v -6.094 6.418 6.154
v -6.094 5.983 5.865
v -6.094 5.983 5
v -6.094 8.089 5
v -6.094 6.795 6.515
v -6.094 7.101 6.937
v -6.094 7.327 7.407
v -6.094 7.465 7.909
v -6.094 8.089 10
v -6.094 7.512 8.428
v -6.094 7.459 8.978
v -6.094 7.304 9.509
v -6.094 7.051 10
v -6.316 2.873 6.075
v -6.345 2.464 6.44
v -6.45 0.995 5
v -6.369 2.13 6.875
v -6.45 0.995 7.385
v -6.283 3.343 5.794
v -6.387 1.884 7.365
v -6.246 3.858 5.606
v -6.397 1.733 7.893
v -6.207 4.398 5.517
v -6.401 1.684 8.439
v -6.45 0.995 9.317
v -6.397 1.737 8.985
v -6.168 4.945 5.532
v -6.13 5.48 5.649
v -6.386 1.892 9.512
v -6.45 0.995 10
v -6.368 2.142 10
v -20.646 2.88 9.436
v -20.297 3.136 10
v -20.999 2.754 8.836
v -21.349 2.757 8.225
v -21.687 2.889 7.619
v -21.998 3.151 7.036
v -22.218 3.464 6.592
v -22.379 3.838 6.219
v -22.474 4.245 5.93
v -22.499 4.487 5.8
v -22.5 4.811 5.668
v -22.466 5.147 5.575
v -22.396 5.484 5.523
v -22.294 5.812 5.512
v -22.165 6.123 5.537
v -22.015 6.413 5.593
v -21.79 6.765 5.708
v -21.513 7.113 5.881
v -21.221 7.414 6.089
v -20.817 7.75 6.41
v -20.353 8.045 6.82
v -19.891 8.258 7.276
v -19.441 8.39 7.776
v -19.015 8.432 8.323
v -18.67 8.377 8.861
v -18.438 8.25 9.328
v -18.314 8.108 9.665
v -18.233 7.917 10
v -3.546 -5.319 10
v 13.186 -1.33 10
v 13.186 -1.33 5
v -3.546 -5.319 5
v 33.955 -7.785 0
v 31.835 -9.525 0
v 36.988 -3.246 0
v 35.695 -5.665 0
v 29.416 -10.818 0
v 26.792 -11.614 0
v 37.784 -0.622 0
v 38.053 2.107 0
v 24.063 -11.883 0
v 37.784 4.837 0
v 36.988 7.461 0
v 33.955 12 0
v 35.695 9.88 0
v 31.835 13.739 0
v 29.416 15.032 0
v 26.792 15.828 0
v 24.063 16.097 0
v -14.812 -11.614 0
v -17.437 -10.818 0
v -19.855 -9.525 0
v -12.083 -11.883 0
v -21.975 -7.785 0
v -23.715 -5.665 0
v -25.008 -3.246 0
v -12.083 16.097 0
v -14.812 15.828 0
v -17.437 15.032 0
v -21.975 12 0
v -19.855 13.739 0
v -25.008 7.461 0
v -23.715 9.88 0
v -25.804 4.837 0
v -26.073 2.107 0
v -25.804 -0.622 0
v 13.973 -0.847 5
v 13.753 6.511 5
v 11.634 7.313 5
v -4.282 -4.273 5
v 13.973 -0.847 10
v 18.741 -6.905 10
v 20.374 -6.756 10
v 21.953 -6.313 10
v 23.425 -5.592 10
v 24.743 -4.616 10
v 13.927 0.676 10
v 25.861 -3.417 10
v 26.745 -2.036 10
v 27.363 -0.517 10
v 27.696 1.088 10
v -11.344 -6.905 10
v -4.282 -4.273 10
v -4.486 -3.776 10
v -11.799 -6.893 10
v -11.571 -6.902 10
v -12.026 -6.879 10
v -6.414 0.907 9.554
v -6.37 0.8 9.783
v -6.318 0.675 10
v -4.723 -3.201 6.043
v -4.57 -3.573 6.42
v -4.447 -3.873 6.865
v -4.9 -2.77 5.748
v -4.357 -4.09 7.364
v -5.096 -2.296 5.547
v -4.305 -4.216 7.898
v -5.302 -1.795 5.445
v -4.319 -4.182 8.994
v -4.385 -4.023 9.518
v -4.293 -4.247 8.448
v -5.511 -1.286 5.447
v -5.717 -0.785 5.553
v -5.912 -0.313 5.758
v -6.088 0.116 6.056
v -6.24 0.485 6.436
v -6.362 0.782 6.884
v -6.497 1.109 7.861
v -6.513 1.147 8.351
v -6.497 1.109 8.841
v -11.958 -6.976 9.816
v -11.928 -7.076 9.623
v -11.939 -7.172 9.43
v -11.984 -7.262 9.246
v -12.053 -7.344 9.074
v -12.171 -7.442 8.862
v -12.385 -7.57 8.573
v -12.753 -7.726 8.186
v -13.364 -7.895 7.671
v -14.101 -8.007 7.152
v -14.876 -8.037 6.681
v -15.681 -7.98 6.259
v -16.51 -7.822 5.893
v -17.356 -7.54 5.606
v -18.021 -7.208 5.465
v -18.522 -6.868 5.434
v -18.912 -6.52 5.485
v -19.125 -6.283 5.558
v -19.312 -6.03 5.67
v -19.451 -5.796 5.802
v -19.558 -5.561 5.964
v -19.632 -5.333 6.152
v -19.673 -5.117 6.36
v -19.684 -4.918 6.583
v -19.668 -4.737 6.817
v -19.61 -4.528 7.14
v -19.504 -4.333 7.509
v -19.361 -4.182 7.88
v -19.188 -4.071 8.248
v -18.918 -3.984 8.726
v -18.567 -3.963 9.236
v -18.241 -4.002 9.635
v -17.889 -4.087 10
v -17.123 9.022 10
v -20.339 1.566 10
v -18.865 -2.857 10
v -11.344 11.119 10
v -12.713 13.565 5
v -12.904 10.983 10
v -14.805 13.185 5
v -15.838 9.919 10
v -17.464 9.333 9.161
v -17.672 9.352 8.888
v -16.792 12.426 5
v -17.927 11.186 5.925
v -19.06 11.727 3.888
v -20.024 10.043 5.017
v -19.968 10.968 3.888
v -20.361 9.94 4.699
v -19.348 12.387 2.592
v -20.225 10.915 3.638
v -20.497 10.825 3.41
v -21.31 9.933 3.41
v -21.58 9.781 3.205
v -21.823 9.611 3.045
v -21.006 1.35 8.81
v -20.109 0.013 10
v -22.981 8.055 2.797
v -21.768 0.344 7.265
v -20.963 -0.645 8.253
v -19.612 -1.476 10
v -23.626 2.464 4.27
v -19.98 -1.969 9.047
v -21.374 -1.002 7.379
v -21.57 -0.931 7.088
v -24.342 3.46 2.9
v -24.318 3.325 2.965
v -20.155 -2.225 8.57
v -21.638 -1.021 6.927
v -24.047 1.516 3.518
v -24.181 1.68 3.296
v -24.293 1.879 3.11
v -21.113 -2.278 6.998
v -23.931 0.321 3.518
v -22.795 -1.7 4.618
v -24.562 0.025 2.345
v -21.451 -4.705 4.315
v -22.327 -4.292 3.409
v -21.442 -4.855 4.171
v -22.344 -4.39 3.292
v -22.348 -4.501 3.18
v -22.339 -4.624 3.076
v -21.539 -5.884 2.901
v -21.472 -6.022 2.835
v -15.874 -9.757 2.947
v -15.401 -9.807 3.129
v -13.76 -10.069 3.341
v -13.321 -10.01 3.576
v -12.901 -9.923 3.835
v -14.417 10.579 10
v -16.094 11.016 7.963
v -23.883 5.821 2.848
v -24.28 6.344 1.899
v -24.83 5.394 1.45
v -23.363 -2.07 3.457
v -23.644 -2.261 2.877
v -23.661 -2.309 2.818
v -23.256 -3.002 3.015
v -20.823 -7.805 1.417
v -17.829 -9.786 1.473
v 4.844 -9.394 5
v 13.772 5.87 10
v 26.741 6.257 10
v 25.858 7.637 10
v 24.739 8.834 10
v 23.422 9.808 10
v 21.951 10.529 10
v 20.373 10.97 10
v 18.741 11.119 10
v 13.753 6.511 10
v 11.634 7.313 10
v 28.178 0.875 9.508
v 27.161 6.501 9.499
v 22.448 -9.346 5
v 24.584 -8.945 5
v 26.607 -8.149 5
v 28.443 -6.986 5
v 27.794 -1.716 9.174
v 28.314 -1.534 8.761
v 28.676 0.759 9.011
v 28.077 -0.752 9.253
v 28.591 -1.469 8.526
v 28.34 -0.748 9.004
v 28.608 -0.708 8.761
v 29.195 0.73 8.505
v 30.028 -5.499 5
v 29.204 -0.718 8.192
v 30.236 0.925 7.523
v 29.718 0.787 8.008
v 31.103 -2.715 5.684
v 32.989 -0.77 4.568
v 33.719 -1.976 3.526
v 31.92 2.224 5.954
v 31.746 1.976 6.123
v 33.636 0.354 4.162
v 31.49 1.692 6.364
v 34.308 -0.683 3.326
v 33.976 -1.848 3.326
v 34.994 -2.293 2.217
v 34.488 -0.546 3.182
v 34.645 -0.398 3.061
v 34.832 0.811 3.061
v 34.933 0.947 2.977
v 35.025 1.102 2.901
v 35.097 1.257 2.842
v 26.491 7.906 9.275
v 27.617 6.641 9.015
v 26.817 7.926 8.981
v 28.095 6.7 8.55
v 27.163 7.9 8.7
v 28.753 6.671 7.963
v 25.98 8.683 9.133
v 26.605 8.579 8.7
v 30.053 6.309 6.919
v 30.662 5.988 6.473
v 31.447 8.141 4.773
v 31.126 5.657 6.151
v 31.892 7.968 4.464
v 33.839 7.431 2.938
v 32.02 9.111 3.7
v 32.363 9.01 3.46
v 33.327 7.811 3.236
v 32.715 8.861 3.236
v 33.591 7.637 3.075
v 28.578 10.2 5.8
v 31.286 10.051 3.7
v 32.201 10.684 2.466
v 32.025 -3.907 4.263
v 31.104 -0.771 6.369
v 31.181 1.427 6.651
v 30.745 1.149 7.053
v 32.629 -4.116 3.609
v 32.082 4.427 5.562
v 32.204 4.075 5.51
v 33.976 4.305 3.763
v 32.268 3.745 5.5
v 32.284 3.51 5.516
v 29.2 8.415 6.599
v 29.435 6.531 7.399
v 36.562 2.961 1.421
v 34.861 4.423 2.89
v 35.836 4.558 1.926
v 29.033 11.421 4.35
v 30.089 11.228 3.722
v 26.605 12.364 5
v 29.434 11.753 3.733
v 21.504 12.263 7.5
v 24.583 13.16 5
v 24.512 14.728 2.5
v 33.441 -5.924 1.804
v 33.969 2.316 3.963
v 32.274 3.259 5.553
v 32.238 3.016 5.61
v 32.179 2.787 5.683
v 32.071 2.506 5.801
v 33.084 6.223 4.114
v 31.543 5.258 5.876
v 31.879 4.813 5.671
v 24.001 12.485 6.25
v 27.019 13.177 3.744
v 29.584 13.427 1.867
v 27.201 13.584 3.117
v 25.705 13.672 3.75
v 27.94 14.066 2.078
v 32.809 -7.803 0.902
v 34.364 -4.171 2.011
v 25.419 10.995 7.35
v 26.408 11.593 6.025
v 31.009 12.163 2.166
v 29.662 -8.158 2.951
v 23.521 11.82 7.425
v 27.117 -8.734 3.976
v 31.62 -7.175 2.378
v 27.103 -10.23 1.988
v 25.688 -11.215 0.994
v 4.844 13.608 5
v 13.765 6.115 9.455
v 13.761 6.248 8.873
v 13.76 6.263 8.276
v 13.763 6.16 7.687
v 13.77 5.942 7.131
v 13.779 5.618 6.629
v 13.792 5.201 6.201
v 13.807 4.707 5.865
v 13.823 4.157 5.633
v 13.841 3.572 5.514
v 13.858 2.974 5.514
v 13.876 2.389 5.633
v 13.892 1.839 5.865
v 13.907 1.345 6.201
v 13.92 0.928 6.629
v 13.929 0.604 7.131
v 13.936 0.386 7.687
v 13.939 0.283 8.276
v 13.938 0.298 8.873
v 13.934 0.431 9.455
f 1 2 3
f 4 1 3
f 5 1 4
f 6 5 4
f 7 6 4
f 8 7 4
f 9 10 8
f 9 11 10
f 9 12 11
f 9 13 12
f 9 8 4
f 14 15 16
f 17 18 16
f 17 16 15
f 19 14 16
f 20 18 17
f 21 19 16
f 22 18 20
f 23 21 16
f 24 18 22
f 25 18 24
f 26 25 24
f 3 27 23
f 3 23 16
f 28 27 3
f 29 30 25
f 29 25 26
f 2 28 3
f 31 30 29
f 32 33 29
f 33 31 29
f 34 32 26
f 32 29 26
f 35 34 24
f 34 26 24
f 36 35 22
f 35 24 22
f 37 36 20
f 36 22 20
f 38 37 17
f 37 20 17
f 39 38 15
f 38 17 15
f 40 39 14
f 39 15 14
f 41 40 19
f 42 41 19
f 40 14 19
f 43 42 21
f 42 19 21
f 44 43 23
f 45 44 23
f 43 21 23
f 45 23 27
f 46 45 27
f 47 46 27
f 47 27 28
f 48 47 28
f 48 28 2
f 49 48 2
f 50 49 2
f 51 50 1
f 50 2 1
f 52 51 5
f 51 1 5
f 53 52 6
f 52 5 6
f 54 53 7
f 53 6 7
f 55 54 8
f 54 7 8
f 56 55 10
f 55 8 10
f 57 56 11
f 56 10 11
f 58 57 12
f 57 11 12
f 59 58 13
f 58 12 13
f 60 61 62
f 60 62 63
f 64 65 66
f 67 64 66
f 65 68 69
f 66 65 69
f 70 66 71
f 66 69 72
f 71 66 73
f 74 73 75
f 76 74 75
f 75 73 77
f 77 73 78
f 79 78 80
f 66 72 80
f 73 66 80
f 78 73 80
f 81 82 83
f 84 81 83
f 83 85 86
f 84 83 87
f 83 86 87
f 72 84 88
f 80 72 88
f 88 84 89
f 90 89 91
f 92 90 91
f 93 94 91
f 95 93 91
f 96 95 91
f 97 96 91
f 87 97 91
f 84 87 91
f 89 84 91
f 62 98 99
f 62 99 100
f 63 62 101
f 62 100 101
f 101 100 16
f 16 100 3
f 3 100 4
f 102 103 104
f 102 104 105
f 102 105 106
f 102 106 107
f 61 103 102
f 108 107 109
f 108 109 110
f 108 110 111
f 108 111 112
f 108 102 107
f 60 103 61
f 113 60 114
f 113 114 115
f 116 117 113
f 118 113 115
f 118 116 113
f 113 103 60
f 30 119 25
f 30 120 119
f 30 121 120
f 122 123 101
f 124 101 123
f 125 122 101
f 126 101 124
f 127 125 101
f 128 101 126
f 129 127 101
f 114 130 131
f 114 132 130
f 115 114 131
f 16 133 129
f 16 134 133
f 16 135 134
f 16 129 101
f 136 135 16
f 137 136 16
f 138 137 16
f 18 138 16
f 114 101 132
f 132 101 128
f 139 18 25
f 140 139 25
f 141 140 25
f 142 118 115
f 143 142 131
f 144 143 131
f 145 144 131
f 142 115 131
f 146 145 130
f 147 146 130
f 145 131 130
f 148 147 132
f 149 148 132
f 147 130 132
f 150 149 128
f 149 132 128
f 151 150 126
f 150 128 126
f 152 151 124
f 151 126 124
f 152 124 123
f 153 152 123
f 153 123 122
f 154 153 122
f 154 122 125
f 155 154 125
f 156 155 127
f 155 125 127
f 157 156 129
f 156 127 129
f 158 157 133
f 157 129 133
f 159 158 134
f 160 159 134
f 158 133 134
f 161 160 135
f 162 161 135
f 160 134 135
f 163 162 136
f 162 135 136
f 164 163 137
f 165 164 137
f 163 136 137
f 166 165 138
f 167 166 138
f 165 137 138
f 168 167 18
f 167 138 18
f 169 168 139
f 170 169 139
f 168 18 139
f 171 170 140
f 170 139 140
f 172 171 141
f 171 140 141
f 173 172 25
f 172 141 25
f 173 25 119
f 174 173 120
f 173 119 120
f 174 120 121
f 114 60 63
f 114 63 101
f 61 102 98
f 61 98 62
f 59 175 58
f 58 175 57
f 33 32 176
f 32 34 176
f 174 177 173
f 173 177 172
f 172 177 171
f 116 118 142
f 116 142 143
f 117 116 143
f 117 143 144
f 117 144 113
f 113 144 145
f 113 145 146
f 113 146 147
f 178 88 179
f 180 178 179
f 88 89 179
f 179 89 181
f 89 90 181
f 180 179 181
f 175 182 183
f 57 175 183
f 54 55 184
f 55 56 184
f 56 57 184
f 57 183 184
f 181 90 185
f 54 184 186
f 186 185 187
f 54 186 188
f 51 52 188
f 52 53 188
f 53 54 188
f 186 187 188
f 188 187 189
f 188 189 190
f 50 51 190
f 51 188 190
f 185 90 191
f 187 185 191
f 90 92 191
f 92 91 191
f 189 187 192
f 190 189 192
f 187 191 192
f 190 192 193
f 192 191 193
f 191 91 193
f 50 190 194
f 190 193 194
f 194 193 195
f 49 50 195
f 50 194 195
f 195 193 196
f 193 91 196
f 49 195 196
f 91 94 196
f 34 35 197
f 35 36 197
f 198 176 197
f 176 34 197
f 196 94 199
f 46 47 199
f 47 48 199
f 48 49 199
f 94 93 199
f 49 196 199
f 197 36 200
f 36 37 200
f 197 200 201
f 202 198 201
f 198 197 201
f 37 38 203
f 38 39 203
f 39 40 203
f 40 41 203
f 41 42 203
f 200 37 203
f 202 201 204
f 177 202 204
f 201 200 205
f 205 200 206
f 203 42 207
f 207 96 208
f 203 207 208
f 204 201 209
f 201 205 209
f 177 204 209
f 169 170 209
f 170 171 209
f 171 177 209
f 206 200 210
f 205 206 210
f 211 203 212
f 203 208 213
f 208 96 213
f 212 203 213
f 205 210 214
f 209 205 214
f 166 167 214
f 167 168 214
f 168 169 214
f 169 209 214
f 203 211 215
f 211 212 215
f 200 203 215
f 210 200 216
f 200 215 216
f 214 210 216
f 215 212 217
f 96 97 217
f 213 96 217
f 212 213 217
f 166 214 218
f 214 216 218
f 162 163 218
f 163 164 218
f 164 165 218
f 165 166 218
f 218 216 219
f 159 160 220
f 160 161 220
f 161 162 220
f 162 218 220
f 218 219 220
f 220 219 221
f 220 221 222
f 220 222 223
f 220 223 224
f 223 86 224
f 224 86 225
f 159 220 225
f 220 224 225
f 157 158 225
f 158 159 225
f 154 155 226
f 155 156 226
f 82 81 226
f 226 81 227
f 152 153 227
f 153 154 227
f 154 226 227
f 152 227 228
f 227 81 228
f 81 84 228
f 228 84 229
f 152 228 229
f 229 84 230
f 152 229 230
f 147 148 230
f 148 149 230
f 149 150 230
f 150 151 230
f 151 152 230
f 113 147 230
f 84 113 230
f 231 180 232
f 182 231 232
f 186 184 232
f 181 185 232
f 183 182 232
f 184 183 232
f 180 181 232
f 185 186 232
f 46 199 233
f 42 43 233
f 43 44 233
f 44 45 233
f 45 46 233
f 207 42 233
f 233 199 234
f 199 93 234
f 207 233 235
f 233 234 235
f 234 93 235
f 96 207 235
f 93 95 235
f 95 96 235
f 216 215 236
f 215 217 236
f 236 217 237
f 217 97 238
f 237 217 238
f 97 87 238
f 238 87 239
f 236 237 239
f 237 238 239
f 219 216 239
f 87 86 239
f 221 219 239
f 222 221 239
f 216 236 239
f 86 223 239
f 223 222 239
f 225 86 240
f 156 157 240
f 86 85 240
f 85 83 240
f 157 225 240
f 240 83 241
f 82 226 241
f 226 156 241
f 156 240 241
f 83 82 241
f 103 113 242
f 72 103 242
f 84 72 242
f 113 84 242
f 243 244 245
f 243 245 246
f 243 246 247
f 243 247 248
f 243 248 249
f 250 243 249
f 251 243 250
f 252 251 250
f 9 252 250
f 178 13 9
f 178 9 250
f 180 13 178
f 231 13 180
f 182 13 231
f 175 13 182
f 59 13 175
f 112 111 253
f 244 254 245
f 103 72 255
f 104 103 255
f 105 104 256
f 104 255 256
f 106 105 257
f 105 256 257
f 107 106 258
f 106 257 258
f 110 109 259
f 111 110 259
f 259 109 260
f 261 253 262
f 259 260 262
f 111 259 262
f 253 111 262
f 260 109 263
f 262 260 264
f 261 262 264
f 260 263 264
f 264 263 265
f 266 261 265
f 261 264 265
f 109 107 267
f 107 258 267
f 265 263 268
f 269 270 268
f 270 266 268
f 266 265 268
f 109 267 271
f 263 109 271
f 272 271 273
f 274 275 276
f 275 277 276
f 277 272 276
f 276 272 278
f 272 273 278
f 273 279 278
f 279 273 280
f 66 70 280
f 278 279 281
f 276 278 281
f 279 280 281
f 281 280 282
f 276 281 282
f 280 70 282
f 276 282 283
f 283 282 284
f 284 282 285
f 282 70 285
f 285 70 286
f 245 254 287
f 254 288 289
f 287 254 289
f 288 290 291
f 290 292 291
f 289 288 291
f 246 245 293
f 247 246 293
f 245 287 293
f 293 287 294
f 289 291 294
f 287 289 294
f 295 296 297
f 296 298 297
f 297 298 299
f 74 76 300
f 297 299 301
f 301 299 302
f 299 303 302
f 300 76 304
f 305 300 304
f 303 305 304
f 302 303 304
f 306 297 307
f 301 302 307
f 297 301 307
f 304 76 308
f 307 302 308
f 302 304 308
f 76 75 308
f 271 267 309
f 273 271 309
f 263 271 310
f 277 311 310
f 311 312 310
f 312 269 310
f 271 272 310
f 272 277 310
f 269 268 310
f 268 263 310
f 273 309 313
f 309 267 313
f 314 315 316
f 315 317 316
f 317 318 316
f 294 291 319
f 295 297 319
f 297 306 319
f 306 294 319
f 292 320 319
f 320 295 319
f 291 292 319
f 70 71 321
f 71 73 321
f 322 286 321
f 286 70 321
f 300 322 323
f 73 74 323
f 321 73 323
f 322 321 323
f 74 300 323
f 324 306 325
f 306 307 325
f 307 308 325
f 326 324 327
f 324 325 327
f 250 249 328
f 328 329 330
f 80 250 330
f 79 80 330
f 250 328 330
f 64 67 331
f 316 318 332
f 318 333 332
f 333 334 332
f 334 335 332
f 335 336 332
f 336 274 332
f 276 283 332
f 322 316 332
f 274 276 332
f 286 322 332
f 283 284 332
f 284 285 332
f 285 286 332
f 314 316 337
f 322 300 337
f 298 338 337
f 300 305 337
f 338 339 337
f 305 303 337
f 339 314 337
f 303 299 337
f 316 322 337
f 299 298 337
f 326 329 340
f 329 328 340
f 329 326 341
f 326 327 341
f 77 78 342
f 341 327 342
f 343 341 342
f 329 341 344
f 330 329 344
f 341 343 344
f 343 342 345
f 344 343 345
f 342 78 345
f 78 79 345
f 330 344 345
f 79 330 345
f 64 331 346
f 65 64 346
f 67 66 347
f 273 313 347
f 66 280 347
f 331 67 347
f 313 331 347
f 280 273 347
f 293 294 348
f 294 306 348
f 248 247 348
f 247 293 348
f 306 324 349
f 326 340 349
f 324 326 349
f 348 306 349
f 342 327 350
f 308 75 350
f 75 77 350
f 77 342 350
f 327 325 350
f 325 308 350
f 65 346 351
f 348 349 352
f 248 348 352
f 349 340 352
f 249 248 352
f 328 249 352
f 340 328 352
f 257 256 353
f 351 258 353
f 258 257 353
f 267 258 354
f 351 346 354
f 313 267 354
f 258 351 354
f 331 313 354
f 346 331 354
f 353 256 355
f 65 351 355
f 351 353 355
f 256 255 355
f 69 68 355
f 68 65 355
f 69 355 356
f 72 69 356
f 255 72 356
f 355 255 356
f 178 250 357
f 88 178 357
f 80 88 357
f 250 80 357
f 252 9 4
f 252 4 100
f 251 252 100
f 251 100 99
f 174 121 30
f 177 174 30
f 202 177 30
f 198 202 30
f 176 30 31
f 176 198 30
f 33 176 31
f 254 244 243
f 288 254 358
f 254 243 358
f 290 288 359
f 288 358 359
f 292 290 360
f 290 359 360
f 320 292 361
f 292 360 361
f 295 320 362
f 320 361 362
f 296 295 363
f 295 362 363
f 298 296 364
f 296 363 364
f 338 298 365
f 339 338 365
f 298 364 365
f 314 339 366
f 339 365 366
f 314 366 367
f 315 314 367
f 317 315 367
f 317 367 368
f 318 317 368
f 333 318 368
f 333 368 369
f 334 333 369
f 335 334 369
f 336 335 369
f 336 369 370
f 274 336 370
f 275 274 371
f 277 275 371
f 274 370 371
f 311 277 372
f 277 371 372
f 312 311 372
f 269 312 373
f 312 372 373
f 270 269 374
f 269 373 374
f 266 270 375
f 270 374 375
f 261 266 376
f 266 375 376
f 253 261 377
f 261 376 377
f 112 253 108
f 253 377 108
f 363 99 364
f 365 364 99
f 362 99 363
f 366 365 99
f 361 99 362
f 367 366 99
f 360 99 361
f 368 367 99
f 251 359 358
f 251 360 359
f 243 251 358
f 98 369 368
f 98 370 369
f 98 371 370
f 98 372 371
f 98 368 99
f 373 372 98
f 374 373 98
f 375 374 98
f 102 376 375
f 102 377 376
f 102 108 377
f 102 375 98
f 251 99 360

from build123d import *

# Parameters (mm, degrees)
POCKET_DEPTH    = 5
SKETCH005_R     = 2.917562
POCKET001_DEPTH = 20.6489723154
SKETCH006_R     = 2.917562
POCKET002_DEPTH = 23.0482544438
SKETCH007_R     = 3
POCKET003_DEPTH = 24.5764305412


with BuildPart() as part:
    # Sketch002 → Loft section 0
    with BuildSketch(Plane.XY.offset(10)):
        with BuildLine():
            ThreePointArc((-11.343506, 11.1193269091), (-20.3555434545, 2.1072894545), (-11.343506, -6.904748))
            Line((-11.343506, -6.904748), (18.7414073452, -6.904748))
            ThreePointArc((18.7414073452, -6.904748), (27.7534447997, 2.1072894545), (18.7414073452, 11.1193269091))
            Line((-11.343506, 11.1193269091), (18.7414073452, 11.1193269091))
        make_face()
    # Sketch003 → Loft section 1
    with BuildSketch(Plane.XY):
        with BuildLine():
            ThreePointArc((-12.0831570349, 16.0971179095), (-26.0729854896, 2.1072894547), (-12.0831570349, -11.882539))
            Line((-12.0831570349, -11.882539), (24.0627546777, -11.882539))
            ThreePointArc((24.0627546777, -11.882539), (38.0525831324, 2.1072894547), (24.0627546777, 16.0971179095))
            Line((-12.0831570349, 16.0971179095), (24.0627546777, 16.0971179095))
        make_face()
    loft()

    # Sketch001 → Pocket (cut)
    with BuildSketch(Plane.XY.offset(10)):
        Polygon((-6.094202, 5.983397), (-6.094202, 8.088668), (11.634386, 7.313041), (13.752719, 6.511327), (13.97268, -0.847062), (13.185631, -1.329644), (-3.545716, -5.318575), (-4.282123, -4.272569), (-6.45014, 0.995308), align=None)
    extrude(amount=-POCKET_DEPTH, mode=Mode.SUBTRACT)

    # Sketch005 → Pocket001 (cut, through all)
    with BuildSketch(Plane(origin=(-6.4881258553, 0.462977012, 0), x_dir=(0.0711766059, 0.9974637291, 0), z_dir=(0.9974637291, -0.0711766059, 0))):
        with Locations((4.141323, 8.428433)):
            Circle(SKETCH005_R)
    extrude(amount=-POCKET001_DEPTH, mode=Mode.SUBTRACT)

    # Sketch006 → Pocket002 (cut, through all)
    with BuildSketch(Plane(origin=(-5.1655859853, -2.1259187014, 0), x_dir=(-0.3805833694, 0.9247466134, 0), z_dir=(0.9247466134, 0.3805833694, 0))):
        with Locations((0.622215, 8.350686)):
            Circle(SKETCH006_R)
    extrude(amount=-POCKET002_DEPTH, mode=Mode.SUBTRACT)

    # Sketch007 → Pocket003 (cut, through all)
    with BuildSketch(Plane(origin=(13.9349074201, 0.4165498958, 0), x_dir=(0.029879202, -0.999553517, 0), z_dir=(-0.999553517, -0.029879202, 0))):
        with Locations((-2.85774, 8.49941)):
            Circle(SKETCH007_R)
    extrude(amount=-POCKET003_DEPTH, mode=Mode.SUBTRACT)


solid = part.part
